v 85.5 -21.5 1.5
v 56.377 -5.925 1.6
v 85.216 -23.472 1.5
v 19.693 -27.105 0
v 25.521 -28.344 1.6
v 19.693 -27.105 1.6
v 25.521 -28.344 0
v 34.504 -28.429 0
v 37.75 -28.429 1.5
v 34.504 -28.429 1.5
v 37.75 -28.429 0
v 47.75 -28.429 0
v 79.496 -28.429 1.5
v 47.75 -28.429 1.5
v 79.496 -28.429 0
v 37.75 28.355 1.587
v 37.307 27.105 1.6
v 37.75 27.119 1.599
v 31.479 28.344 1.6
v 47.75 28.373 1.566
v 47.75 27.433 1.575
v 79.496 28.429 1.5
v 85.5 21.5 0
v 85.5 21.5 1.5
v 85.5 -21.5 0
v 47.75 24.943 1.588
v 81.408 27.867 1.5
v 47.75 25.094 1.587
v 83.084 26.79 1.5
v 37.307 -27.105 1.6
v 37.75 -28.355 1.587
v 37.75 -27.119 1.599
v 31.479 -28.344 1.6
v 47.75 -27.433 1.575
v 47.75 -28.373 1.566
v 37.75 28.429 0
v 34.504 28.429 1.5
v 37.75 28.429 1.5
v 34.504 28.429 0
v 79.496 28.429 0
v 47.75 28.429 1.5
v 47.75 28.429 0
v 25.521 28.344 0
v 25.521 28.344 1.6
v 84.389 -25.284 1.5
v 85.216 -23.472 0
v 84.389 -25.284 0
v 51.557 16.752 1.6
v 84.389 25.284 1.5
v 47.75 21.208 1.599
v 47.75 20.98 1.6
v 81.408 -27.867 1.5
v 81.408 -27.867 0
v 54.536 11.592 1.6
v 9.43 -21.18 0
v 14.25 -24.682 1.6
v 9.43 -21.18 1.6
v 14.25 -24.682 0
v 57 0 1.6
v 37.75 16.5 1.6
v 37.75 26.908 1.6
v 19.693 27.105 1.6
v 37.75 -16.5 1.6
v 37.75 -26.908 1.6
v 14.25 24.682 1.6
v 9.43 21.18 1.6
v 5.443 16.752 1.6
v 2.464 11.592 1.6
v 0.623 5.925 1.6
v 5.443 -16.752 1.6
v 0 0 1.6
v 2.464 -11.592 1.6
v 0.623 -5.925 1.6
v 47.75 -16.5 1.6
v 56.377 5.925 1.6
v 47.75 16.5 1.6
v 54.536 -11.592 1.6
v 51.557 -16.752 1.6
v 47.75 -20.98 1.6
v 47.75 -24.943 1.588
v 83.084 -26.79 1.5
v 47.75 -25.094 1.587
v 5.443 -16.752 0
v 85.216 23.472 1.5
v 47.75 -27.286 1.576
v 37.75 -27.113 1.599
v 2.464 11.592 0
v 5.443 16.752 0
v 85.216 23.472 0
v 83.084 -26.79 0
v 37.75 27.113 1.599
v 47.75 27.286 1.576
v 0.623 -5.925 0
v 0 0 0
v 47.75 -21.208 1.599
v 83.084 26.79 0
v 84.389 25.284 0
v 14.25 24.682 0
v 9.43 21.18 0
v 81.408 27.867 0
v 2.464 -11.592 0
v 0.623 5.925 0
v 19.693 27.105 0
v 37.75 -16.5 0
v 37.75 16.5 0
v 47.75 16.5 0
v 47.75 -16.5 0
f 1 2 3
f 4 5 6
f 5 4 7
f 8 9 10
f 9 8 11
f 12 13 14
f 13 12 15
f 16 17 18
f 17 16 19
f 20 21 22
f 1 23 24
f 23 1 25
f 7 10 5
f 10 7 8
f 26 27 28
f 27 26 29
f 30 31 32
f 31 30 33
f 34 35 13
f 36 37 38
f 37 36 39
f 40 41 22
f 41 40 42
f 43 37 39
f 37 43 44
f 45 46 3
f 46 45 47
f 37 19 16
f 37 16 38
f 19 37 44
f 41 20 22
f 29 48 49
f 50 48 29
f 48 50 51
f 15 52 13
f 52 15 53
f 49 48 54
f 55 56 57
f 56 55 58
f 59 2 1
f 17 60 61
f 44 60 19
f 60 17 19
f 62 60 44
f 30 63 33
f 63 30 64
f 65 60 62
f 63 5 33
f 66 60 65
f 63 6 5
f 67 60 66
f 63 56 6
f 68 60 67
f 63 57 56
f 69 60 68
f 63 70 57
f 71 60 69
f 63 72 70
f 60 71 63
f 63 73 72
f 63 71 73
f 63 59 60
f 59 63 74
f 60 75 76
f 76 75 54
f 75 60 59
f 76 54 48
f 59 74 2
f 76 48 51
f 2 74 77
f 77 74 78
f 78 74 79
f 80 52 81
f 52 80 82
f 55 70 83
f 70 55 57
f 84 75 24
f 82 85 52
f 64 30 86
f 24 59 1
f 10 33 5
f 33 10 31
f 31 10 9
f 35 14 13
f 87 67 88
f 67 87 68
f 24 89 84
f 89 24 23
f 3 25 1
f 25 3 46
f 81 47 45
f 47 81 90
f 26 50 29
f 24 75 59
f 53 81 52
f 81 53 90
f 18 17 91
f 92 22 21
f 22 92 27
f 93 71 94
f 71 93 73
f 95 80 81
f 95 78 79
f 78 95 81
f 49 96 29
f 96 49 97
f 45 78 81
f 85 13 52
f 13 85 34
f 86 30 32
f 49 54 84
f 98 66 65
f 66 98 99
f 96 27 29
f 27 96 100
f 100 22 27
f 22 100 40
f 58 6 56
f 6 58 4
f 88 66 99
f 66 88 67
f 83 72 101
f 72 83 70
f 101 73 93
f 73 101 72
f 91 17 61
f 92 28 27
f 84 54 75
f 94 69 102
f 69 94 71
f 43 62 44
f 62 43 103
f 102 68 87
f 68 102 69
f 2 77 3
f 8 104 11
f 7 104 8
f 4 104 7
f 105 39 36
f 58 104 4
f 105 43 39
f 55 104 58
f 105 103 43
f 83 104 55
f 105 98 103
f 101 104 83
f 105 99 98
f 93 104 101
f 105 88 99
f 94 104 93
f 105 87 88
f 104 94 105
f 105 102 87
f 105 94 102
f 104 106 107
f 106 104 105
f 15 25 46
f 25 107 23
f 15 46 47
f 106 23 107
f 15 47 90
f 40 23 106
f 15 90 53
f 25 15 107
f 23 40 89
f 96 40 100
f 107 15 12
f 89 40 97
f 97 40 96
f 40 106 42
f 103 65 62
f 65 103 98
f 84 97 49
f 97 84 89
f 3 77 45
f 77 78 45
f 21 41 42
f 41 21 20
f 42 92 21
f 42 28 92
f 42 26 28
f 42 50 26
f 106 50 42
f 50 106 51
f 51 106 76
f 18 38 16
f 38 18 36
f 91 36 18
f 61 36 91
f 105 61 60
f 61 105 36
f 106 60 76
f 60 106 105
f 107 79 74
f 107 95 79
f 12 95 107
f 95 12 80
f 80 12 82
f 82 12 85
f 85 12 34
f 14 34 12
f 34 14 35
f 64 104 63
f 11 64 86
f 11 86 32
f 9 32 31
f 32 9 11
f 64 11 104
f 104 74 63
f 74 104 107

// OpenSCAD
ww=12;
tw=10;
hh=2;

cw=57;
pcbh=1.6;
mr=7;

difference(){
  translate([cw/2,0,0])
  hull(){
    cylinder(h=pcbh, r=cw/2);
    minkowski(){
    translate([mr,-(cw-mr*2)/2,0]) cube([cw-mr*2,cw-mr*2,pcbh-0.1*2]);
    cylinder(h=0.1, r=mr);
    }
  }

//wheel convex
  translate([(cw+cw/2)/2-tw/2,cw/2-ww,-0.2]) cube([tw, ww, hh]);
  translate([(cw+cw/2)/2-tw/2,-cw/2,-0.2]) cube([tw, ww, hh]);
}

module m_base(){
  color("pink") translate([0,-cw/2,-4])cube([cw+cw/2,cw,2]);
  color("pink") translate([10,-cw/2,-2])cube([2,cw,2]);
  color("pink") translate([-10+cw+cw/2,-cw/2,-2])cube([2,cw,2]);
}
